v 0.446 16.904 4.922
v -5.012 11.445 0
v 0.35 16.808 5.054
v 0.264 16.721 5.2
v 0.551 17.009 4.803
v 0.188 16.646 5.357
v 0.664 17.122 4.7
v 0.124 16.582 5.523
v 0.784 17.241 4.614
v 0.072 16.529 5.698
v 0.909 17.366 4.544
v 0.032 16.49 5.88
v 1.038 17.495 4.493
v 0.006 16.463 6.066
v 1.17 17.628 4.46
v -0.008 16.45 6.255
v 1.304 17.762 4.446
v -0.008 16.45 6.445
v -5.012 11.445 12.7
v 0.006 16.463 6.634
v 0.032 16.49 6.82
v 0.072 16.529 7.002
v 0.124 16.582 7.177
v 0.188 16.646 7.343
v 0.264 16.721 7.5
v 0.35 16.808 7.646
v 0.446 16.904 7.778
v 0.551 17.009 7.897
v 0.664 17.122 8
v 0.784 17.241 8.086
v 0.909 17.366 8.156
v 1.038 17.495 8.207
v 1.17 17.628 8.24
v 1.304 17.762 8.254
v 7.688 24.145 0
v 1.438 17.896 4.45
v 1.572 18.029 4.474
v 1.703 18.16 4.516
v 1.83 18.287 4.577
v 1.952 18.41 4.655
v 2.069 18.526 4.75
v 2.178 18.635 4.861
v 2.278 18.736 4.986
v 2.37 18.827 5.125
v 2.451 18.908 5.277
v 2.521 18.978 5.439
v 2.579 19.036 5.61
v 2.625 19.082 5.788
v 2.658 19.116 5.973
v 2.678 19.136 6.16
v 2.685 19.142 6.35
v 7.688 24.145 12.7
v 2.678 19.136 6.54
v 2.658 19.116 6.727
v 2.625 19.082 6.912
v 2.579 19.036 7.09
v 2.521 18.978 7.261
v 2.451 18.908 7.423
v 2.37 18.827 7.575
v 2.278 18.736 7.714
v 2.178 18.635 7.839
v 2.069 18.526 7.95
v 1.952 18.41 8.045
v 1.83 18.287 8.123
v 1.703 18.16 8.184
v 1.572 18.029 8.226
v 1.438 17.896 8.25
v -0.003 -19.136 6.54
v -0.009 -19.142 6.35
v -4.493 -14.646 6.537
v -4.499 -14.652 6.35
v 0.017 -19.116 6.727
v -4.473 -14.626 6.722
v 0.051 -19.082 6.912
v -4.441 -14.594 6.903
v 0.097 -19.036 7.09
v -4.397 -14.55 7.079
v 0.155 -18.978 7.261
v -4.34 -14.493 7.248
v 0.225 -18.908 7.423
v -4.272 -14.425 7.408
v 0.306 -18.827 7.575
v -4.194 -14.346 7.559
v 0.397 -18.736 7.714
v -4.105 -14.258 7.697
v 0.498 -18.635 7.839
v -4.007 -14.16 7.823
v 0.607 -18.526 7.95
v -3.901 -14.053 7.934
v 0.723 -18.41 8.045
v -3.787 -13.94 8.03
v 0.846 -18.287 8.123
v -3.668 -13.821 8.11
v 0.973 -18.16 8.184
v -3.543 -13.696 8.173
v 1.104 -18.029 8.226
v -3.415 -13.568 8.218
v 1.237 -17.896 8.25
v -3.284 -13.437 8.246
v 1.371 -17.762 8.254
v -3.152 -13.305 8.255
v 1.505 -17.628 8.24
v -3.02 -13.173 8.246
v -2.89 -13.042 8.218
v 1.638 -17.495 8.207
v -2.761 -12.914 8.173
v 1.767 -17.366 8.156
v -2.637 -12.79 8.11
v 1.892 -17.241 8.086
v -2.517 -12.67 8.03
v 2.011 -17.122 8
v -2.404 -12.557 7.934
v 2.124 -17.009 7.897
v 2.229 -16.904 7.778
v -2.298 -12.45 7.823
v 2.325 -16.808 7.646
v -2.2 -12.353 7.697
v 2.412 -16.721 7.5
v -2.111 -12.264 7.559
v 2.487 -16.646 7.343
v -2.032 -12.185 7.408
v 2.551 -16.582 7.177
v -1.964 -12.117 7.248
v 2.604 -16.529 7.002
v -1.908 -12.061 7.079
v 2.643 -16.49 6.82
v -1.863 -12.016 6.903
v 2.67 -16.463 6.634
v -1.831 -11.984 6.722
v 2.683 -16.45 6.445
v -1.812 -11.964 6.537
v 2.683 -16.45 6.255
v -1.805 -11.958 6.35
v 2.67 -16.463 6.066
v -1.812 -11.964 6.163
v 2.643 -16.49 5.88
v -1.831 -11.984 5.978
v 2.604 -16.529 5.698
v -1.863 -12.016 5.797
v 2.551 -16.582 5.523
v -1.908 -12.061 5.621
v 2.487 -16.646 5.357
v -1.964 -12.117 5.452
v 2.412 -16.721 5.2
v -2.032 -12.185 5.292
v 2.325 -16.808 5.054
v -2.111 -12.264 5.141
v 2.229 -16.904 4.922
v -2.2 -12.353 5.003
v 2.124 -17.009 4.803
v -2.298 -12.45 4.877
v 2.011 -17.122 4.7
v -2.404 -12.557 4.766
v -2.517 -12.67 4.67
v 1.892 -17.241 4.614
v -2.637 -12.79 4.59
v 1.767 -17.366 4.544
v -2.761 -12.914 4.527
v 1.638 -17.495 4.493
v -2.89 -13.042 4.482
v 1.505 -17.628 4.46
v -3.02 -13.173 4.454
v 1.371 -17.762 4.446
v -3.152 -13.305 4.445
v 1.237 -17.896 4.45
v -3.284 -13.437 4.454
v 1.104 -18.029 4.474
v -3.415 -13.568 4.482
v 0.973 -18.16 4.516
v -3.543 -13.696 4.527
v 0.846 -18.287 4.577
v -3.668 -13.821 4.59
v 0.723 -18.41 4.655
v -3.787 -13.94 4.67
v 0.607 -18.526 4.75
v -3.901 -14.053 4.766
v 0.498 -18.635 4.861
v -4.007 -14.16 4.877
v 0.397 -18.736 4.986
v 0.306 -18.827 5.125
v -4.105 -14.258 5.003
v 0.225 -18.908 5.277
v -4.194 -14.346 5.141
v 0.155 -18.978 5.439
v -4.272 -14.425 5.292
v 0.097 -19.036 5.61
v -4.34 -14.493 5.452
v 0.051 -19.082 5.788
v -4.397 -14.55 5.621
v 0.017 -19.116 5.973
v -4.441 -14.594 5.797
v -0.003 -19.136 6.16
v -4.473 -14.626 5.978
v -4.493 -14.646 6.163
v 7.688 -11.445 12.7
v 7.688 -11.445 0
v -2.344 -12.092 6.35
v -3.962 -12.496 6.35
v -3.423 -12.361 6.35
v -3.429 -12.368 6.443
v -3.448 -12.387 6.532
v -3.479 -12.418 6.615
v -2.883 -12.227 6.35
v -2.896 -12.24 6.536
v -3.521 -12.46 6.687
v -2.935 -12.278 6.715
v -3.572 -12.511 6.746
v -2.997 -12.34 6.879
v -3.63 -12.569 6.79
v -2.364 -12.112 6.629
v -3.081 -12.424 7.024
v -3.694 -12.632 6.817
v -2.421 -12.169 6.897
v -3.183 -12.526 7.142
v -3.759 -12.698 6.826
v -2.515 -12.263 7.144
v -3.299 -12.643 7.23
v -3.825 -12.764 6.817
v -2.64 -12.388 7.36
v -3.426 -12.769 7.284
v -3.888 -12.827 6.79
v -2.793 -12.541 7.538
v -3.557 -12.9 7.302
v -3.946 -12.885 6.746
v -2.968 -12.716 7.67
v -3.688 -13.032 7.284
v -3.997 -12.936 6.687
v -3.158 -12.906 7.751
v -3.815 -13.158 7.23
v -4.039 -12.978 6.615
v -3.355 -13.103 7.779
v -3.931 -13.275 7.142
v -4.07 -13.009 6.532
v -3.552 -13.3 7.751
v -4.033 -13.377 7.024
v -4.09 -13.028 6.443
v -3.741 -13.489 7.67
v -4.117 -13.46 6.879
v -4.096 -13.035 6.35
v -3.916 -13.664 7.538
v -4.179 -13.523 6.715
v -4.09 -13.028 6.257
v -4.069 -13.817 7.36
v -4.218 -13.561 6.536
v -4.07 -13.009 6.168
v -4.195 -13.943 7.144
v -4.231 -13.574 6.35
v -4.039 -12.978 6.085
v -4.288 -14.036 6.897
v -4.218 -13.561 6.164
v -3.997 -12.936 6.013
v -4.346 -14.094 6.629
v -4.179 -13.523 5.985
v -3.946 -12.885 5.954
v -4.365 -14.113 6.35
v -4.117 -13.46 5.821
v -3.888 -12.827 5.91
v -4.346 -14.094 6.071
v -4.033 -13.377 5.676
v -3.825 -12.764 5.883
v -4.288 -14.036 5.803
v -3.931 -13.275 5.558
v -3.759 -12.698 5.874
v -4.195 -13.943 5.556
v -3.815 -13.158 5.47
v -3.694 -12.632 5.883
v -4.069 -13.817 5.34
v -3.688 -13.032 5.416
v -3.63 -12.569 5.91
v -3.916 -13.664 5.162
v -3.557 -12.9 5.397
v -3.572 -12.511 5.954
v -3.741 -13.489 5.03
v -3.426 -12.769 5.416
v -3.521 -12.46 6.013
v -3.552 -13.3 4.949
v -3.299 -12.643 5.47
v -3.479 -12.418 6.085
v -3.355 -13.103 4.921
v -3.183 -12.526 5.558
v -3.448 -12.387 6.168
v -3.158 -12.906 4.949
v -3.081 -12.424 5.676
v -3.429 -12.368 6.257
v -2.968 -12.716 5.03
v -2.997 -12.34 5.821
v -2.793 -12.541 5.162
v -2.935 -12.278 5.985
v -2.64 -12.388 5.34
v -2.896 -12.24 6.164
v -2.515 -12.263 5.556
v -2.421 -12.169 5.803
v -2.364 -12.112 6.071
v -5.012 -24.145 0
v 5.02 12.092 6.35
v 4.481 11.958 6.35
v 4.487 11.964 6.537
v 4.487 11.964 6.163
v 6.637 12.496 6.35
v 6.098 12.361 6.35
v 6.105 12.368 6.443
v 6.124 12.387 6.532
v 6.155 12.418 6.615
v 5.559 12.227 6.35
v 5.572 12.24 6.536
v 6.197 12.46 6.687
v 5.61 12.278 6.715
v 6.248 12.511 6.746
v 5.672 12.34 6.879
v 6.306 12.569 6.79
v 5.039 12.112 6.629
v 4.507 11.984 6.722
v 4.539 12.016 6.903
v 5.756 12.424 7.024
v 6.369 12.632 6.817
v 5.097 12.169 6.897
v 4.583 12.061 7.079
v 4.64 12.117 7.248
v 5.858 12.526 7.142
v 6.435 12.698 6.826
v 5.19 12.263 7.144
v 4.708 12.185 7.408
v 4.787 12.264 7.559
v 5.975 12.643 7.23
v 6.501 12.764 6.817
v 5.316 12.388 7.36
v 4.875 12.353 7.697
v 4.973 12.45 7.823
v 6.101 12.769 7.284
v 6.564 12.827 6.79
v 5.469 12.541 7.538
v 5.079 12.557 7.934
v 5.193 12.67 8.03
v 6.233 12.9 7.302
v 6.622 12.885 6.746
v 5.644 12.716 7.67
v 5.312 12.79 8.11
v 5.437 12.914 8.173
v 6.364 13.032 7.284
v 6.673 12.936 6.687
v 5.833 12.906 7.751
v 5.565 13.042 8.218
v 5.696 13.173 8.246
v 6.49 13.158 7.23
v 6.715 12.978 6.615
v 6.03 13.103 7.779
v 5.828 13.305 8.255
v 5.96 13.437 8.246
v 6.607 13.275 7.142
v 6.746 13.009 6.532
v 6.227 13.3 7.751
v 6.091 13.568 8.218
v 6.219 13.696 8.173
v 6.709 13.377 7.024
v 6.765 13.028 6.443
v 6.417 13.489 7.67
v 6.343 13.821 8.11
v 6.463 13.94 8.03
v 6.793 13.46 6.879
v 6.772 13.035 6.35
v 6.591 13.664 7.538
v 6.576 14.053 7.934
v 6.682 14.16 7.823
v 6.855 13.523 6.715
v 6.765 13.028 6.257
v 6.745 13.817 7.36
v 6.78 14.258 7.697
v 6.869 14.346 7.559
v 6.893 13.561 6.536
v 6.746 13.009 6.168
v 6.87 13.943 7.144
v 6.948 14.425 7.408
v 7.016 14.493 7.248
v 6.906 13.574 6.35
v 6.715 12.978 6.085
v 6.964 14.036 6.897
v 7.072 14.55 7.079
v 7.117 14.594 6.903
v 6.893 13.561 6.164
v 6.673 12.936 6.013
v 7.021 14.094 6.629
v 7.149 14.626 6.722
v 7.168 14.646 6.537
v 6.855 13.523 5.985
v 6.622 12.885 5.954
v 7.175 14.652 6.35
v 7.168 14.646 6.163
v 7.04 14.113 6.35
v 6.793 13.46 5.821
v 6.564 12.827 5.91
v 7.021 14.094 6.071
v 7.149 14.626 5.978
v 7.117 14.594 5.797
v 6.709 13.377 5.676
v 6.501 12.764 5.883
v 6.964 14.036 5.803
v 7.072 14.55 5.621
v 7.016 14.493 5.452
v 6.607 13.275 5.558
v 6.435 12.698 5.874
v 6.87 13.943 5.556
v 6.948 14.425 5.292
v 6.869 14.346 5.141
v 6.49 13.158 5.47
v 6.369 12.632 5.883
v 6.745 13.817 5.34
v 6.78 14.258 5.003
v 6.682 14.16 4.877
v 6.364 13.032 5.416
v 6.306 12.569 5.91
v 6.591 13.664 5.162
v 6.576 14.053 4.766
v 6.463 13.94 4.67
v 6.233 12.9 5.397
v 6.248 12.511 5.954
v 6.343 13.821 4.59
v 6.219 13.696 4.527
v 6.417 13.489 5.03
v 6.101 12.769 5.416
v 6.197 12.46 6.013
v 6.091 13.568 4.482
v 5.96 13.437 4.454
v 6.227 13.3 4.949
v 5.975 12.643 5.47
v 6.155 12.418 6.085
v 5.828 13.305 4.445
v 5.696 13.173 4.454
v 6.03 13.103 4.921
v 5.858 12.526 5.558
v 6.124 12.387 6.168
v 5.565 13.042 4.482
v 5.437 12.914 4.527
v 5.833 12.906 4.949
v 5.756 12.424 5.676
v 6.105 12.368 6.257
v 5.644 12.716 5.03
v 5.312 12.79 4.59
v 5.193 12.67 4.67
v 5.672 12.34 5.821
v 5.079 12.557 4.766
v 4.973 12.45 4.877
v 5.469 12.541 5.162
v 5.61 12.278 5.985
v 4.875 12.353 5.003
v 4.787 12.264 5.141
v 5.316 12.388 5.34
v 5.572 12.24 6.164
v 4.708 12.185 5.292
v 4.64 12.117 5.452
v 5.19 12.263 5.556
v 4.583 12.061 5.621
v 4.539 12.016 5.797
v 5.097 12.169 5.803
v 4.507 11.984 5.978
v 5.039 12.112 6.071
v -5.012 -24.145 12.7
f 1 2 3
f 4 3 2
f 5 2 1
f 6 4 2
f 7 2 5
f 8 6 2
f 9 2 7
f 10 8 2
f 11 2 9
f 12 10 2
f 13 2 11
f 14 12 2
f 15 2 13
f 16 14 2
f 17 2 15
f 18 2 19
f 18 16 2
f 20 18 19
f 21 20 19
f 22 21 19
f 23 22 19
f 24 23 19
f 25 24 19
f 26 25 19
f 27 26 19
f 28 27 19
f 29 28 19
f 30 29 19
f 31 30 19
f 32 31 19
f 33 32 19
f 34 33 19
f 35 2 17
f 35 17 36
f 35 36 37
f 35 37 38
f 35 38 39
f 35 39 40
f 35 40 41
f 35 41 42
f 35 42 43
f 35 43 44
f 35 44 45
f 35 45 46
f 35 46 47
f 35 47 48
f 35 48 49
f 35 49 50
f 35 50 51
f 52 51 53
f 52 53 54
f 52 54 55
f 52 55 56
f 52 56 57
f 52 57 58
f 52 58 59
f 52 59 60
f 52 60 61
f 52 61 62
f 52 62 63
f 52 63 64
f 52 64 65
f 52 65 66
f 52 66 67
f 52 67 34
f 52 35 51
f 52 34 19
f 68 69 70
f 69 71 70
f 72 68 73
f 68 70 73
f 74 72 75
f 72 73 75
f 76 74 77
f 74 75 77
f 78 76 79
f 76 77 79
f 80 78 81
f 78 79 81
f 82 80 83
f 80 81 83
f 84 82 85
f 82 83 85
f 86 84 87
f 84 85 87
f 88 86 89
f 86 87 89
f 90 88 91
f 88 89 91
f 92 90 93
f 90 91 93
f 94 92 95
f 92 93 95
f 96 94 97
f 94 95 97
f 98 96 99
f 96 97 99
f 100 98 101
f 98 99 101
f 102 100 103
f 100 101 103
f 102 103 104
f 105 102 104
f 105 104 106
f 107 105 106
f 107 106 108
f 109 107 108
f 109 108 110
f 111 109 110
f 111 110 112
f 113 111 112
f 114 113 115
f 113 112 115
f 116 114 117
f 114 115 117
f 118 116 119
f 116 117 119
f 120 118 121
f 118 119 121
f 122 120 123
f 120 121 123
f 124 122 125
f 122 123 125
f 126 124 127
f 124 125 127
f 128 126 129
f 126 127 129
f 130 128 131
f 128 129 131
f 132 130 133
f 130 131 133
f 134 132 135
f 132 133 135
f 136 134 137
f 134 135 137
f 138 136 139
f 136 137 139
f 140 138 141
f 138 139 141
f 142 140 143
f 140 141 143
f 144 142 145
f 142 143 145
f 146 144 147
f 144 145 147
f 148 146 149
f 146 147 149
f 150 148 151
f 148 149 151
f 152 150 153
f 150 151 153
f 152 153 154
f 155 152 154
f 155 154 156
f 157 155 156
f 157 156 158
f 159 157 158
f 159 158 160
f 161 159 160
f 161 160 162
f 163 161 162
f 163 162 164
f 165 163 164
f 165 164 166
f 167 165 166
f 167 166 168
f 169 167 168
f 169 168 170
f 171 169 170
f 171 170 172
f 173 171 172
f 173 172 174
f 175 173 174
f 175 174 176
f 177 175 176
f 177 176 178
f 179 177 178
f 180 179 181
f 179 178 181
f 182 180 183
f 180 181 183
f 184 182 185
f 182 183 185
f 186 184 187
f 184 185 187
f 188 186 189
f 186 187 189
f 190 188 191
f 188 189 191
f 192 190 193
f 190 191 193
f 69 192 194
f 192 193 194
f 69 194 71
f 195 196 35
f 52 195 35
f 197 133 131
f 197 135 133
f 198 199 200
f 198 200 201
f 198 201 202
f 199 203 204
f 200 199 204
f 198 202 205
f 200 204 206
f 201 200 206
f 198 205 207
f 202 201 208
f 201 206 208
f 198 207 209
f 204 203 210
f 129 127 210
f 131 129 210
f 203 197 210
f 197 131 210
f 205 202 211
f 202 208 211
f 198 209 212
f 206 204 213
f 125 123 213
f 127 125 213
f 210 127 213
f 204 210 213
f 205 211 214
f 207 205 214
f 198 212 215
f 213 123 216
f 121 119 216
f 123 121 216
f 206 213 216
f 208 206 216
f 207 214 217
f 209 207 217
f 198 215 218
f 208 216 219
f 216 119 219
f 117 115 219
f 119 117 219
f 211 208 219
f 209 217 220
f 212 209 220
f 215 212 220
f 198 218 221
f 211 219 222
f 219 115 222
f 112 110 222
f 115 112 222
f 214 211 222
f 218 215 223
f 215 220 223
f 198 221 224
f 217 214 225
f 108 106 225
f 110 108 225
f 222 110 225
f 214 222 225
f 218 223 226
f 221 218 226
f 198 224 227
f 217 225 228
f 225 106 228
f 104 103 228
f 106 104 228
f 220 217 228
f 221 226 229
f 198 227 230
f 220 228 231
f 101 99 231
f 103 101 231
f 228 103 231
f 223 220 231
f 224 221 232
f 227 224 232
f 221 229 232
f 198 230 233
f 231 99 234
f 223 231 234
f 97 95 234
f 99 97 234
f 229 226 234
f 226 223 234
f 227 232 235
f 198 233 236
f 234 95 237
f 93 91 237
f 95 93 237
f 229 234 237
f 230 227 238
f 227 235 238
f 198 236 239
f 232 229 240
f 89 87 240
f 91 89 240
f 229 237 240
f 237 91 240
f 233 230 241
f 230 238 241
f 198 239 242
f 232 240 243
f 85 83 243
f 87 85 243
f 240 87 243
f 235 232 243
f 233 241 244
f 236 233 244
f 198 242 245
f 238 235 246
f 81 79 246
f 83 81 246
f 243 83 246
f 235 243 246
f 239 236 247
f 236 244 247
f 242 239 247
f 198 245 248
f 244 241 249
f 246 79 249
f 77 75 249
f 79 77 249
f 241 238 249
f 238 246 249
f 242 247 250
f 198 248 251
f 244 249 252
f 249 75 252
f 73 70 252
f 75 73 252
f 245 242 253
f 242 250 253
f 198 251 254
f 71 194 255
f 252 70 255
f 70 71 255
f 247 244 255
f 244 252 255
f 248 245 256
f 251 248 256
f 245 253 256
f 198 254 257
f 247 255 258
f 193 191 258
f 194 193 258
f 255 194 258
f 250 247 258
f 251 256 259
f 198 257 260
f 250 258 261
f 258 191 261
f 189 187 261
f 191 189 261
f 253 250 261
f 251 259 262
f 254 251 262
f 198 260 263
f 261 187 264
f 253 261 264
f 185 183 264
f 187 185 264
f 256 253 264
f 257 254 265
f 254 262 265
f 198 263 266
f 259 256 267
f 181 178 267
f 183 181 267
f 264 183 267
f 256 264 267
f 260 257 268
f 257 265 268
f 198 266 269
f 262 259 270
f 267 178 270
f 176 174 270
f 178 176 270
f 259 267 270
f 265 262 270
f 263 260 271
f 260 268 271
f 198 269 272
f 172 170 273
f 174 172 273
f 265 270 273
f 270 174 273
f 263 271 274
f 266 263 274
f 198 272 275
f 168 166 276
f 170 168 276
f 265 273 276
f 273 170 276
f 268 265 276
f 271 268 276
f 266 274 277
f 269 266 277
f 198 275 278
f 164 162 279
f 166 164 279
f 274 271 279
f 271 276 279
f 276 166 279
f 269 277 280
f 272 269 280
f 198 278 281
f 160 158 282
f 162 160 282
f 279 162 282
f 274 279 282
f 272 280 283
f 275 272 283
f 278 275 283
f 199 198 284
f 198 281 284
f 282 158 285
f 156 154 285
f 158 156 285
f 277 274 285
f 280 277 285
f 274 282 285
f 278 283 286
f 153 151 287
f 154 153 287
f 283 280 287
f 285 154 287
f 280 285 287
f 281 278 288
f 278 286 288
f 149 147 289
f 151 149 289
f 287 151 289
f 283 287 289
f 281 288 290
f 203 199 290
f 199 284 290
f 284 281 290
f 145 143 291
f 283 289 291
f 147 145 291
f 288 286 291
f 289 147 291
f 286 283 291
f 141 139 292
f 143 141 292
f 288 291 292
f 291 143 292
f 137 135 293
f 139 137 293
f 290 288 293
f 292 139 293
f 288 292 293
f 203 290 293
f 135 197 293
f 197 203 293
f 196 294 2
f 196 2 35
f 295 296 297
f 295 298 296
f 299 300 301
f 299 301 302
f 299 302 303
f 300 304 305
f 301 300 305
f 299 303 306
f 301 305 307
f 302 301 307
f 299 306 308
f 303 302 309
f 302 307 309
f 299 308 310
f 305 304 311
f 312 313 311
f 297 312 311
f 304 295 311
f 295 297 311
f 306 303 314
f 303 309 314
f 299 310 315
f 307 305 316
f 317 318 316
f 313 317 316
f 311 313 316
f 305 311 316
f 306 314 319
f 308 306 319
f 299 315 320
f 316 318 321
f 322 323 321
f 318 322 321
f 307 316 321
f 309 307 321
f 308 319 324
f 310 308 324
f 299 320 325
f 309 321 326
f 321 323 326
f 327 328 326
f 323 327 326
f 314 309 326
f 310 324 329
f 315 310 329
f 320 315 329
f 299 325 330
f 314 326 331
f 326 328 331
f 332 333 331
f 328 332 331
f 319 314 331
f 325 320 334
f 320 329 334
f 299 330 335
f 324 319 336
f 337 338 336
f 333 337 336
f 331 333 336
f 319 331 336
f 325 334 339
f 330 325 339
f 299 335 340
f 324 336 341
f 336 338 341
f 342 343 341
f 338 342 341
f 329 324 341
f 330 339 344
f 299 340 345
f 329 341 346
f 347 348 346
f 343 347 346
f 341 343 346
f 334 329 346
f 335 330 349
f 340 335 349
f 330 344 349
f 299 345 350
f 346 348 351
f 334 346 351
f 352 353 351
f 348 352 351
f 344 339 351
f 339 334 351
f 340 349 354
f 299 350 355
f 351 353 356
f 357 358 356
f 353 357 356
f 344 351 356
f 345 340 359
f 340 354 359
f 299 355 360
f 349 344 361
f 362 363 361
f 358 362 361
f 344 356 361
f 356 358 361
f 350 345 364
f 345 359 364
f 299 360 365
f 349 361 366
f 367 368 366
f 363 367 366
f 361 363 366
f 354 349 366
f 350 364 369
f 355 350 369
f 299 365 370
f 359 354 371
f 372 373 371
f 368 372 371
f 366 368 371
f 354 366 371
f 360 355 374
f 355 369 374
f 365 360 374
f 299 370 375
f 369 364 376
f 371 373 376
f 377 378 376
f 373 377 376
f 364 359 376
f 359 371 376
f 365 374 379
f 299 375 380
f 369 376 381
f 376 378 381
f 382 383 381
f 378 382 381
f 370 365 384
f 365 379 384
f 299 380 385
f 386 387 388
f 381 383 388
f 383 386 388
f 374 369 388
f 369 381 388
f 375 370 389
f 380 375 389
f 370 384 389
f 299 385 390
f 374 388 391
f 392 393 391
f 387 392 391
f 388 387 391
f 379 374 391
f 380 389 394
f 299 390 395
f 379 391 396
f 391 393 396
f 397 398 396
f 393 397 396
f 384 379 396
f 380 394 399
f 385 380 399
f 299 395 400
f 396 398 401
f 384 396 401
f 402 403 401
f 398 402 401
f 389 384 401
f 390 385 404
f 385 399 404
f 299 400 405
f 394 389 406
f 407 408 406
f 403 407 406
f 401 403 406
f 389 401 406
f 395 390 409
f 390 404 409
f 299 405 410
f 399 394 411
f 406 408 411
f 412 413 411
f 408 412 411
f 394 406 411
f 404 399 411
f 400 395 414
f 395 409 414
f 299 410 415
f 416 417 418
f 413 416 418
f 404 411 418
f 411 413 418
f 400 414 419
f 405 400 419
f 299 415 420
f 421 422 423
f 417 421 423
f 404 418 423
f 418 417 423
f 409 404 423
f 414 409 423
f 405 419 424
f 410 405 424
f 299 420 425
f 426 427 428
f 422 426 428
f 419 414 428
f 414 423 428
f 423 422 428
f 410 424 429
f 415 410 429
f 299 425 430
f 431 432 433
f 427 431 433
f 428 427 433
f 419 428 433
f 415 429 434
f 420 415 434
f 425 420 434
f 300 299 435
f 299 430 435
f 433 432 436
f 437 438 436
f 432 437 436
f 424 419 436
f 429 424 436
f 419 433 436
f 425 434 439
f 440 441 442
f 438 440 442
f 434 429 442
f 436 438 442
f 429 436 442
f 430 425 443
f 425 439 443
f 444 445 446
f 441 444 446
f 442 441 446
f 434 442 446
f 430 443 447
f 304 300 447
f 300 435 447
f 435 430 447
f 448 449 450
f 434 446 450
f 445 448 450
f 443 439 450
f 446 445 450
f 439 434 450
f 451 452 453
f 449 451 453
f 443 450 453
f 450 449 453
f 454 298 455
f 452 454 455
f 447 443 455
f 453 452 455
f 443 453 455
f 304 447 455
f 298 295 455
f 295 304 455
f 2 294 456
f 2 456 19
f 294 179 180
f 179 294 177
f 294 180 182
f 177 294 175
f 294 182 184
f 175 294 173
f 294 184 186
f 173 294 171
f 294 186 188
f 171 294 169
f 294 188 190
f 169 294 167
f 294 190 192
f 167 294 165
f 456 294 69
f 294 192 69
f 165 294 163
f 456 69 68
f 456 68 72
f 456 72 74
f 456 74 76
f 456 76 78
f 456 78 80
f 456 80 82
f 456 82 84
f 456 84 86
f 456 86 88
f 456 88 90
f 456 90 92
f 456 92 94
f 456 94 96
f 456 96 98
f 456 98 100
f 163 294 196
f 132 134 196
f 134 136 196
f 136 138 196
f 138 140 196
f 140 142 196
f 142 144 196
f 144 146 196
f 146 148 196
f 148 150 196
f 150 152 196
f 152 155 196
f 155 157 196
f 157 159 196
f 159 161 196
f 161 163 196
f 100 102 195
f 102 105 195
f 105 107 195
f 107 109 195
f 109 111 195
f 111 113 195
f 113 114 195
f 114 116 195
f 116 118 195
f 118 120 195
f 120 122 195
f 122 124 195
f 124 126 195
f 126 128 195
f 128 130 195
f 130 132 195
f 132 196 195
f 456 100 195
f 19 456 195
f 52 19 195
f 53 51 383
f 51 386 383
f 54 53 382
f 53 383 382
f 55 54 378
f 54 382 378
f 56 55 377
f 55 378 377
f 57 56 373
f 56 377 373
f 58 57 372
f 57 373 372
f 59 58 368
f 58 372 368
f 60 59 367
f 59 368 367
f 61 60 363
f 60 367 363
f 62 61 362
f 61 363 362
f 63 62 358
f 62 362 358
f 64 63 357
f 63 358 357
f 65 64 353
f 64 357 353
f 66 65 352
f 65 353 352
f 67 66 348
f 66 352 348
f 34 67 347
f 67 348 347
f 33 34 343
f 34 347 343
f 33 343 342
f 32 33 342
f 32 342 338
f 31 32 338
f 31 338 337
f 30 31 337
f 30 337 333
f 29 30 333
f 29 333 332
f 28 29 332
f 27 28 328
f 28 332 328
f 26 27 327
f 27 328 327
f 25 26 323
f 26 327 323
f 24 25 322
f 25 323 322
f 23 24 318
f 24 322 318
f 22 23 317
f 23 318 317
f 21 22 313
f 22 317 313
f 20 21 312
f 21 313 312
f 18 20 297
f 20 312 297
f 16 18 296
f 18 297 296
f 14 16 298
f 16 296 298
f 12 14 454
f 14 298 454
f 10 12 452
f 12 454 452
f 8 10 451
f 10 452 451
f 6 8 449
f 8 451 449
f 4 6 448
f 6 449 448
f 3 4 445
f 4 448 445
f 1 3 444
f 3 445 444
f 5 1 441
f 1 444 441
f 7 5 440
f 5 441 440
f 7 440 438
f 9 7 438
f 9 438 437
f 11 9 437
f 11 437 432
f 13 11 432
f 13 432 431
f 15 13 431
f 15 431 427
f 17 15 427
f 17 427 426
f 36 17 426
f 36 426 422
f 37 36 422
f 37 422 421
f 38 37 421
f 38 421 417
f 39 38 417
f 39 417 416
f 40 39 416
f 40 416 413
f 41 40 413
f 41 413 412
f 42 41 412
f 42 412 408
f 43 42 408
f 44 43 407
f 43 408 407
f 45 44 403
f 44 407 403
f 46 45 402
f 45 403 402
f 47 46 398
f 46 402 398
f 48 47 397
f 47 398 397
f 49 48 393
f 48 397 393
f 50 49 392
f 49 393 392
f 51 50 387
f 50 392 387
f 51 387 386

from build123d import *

# Parameters (mm, degrees)
F0_W           = 12.7
F0_H           = 48.29048
F1_DEPTH       = 12.7
F2_SIZE2       = 12.69999
F2_SIZE        = 12.69999
F3_SIZE2       = 12.69999
F3_SIZE        = 12.69999
F6_D           = 3.81
F6_DEPTH       = 6.35
F6_TIP         = 1.1446394792
F6_ON_F4_D     = 3.81
F6_ON_F4_DEPTH = 6.35
F6_ON_F4_TIP   = 1.1446394792


# Not quite as in the source:
# - a fillet or chamfer is up to 0.001 mm smaller than in the source, because OpenCascade refuses the exact size


with BuildPart() as f1:
    # F0 (on Top) → F1 (new body)
    with BuildSketch(Plane.XY):
        with Locations((1.3377478731, 0)):
            Rectangle(F0_W, F0_H)
    extrude(amount=F1_DEPTH)

    # F2 (size 12.7 and 12.7 in the source; OpenCascade refuses exactly that, so slightly less here)
    f2_edges = [f1.edges().sort_by_distance(p)[0] for p in [
        (7.687748, -24.14524, 6.35),
    ]]
    chamfer(f2_edges, length=F2_SIZE, length2=F2_SIZE2)

    # F3 (size 12.7 and 12.7 in the source; OpenCascade refuses exactly that, so slightly less here)
    f3_edges = [f1.edges().sort_by_distance(p)[0] for p in [
        (-5.012252, 24.14524, 6.35),
    ]]
    chamfer(f3_edges, length=F3_SIZE, length2=F3_SIZE2)

    # F6
    with Locations(Plane(origin=(9.5664939365, -9.5664939365, 0), x_dir=(0.7071067812, 0.7071067812, 0), z_dir=(0.7071067812, -0.7071067812, 0))):
        with Locations((-11.6371181632, 6.35)):
            Hole(F6_D / 2, depth=F6_DEPTH)
            with Locations((0, 0, -(F6_DEPTH + F6_TIP / 2))):  # 118° drill point
                Cone(0, F6_D / 2, F6_TIP, mode=Mode.SUBTRACT)

    # F6 on F4
    with Locations(Plane(origin=(-8.2287460635, 8.2287460635, 0), x_dir=(-0.7071067812, -0.7071067812, 0), z_dir=(-0.7071067812, 0.7071067812, 0))):
        with Locations((-13.5289793484, 6.35)):
            Hole(F6_ON_F4_D / 2, depth=F6_ON_F4_DEPTH)
            with Locations((0, 0, -(F6_ON_F4_DEPTH + F6_ON_F4_TIP / 2))):  # 118° drill point
                Cone(0, F6_ON_F4_D / 2, F6_ON_F4_TIP, mode=Mode.SUBTRACT)


solid = f1.part
